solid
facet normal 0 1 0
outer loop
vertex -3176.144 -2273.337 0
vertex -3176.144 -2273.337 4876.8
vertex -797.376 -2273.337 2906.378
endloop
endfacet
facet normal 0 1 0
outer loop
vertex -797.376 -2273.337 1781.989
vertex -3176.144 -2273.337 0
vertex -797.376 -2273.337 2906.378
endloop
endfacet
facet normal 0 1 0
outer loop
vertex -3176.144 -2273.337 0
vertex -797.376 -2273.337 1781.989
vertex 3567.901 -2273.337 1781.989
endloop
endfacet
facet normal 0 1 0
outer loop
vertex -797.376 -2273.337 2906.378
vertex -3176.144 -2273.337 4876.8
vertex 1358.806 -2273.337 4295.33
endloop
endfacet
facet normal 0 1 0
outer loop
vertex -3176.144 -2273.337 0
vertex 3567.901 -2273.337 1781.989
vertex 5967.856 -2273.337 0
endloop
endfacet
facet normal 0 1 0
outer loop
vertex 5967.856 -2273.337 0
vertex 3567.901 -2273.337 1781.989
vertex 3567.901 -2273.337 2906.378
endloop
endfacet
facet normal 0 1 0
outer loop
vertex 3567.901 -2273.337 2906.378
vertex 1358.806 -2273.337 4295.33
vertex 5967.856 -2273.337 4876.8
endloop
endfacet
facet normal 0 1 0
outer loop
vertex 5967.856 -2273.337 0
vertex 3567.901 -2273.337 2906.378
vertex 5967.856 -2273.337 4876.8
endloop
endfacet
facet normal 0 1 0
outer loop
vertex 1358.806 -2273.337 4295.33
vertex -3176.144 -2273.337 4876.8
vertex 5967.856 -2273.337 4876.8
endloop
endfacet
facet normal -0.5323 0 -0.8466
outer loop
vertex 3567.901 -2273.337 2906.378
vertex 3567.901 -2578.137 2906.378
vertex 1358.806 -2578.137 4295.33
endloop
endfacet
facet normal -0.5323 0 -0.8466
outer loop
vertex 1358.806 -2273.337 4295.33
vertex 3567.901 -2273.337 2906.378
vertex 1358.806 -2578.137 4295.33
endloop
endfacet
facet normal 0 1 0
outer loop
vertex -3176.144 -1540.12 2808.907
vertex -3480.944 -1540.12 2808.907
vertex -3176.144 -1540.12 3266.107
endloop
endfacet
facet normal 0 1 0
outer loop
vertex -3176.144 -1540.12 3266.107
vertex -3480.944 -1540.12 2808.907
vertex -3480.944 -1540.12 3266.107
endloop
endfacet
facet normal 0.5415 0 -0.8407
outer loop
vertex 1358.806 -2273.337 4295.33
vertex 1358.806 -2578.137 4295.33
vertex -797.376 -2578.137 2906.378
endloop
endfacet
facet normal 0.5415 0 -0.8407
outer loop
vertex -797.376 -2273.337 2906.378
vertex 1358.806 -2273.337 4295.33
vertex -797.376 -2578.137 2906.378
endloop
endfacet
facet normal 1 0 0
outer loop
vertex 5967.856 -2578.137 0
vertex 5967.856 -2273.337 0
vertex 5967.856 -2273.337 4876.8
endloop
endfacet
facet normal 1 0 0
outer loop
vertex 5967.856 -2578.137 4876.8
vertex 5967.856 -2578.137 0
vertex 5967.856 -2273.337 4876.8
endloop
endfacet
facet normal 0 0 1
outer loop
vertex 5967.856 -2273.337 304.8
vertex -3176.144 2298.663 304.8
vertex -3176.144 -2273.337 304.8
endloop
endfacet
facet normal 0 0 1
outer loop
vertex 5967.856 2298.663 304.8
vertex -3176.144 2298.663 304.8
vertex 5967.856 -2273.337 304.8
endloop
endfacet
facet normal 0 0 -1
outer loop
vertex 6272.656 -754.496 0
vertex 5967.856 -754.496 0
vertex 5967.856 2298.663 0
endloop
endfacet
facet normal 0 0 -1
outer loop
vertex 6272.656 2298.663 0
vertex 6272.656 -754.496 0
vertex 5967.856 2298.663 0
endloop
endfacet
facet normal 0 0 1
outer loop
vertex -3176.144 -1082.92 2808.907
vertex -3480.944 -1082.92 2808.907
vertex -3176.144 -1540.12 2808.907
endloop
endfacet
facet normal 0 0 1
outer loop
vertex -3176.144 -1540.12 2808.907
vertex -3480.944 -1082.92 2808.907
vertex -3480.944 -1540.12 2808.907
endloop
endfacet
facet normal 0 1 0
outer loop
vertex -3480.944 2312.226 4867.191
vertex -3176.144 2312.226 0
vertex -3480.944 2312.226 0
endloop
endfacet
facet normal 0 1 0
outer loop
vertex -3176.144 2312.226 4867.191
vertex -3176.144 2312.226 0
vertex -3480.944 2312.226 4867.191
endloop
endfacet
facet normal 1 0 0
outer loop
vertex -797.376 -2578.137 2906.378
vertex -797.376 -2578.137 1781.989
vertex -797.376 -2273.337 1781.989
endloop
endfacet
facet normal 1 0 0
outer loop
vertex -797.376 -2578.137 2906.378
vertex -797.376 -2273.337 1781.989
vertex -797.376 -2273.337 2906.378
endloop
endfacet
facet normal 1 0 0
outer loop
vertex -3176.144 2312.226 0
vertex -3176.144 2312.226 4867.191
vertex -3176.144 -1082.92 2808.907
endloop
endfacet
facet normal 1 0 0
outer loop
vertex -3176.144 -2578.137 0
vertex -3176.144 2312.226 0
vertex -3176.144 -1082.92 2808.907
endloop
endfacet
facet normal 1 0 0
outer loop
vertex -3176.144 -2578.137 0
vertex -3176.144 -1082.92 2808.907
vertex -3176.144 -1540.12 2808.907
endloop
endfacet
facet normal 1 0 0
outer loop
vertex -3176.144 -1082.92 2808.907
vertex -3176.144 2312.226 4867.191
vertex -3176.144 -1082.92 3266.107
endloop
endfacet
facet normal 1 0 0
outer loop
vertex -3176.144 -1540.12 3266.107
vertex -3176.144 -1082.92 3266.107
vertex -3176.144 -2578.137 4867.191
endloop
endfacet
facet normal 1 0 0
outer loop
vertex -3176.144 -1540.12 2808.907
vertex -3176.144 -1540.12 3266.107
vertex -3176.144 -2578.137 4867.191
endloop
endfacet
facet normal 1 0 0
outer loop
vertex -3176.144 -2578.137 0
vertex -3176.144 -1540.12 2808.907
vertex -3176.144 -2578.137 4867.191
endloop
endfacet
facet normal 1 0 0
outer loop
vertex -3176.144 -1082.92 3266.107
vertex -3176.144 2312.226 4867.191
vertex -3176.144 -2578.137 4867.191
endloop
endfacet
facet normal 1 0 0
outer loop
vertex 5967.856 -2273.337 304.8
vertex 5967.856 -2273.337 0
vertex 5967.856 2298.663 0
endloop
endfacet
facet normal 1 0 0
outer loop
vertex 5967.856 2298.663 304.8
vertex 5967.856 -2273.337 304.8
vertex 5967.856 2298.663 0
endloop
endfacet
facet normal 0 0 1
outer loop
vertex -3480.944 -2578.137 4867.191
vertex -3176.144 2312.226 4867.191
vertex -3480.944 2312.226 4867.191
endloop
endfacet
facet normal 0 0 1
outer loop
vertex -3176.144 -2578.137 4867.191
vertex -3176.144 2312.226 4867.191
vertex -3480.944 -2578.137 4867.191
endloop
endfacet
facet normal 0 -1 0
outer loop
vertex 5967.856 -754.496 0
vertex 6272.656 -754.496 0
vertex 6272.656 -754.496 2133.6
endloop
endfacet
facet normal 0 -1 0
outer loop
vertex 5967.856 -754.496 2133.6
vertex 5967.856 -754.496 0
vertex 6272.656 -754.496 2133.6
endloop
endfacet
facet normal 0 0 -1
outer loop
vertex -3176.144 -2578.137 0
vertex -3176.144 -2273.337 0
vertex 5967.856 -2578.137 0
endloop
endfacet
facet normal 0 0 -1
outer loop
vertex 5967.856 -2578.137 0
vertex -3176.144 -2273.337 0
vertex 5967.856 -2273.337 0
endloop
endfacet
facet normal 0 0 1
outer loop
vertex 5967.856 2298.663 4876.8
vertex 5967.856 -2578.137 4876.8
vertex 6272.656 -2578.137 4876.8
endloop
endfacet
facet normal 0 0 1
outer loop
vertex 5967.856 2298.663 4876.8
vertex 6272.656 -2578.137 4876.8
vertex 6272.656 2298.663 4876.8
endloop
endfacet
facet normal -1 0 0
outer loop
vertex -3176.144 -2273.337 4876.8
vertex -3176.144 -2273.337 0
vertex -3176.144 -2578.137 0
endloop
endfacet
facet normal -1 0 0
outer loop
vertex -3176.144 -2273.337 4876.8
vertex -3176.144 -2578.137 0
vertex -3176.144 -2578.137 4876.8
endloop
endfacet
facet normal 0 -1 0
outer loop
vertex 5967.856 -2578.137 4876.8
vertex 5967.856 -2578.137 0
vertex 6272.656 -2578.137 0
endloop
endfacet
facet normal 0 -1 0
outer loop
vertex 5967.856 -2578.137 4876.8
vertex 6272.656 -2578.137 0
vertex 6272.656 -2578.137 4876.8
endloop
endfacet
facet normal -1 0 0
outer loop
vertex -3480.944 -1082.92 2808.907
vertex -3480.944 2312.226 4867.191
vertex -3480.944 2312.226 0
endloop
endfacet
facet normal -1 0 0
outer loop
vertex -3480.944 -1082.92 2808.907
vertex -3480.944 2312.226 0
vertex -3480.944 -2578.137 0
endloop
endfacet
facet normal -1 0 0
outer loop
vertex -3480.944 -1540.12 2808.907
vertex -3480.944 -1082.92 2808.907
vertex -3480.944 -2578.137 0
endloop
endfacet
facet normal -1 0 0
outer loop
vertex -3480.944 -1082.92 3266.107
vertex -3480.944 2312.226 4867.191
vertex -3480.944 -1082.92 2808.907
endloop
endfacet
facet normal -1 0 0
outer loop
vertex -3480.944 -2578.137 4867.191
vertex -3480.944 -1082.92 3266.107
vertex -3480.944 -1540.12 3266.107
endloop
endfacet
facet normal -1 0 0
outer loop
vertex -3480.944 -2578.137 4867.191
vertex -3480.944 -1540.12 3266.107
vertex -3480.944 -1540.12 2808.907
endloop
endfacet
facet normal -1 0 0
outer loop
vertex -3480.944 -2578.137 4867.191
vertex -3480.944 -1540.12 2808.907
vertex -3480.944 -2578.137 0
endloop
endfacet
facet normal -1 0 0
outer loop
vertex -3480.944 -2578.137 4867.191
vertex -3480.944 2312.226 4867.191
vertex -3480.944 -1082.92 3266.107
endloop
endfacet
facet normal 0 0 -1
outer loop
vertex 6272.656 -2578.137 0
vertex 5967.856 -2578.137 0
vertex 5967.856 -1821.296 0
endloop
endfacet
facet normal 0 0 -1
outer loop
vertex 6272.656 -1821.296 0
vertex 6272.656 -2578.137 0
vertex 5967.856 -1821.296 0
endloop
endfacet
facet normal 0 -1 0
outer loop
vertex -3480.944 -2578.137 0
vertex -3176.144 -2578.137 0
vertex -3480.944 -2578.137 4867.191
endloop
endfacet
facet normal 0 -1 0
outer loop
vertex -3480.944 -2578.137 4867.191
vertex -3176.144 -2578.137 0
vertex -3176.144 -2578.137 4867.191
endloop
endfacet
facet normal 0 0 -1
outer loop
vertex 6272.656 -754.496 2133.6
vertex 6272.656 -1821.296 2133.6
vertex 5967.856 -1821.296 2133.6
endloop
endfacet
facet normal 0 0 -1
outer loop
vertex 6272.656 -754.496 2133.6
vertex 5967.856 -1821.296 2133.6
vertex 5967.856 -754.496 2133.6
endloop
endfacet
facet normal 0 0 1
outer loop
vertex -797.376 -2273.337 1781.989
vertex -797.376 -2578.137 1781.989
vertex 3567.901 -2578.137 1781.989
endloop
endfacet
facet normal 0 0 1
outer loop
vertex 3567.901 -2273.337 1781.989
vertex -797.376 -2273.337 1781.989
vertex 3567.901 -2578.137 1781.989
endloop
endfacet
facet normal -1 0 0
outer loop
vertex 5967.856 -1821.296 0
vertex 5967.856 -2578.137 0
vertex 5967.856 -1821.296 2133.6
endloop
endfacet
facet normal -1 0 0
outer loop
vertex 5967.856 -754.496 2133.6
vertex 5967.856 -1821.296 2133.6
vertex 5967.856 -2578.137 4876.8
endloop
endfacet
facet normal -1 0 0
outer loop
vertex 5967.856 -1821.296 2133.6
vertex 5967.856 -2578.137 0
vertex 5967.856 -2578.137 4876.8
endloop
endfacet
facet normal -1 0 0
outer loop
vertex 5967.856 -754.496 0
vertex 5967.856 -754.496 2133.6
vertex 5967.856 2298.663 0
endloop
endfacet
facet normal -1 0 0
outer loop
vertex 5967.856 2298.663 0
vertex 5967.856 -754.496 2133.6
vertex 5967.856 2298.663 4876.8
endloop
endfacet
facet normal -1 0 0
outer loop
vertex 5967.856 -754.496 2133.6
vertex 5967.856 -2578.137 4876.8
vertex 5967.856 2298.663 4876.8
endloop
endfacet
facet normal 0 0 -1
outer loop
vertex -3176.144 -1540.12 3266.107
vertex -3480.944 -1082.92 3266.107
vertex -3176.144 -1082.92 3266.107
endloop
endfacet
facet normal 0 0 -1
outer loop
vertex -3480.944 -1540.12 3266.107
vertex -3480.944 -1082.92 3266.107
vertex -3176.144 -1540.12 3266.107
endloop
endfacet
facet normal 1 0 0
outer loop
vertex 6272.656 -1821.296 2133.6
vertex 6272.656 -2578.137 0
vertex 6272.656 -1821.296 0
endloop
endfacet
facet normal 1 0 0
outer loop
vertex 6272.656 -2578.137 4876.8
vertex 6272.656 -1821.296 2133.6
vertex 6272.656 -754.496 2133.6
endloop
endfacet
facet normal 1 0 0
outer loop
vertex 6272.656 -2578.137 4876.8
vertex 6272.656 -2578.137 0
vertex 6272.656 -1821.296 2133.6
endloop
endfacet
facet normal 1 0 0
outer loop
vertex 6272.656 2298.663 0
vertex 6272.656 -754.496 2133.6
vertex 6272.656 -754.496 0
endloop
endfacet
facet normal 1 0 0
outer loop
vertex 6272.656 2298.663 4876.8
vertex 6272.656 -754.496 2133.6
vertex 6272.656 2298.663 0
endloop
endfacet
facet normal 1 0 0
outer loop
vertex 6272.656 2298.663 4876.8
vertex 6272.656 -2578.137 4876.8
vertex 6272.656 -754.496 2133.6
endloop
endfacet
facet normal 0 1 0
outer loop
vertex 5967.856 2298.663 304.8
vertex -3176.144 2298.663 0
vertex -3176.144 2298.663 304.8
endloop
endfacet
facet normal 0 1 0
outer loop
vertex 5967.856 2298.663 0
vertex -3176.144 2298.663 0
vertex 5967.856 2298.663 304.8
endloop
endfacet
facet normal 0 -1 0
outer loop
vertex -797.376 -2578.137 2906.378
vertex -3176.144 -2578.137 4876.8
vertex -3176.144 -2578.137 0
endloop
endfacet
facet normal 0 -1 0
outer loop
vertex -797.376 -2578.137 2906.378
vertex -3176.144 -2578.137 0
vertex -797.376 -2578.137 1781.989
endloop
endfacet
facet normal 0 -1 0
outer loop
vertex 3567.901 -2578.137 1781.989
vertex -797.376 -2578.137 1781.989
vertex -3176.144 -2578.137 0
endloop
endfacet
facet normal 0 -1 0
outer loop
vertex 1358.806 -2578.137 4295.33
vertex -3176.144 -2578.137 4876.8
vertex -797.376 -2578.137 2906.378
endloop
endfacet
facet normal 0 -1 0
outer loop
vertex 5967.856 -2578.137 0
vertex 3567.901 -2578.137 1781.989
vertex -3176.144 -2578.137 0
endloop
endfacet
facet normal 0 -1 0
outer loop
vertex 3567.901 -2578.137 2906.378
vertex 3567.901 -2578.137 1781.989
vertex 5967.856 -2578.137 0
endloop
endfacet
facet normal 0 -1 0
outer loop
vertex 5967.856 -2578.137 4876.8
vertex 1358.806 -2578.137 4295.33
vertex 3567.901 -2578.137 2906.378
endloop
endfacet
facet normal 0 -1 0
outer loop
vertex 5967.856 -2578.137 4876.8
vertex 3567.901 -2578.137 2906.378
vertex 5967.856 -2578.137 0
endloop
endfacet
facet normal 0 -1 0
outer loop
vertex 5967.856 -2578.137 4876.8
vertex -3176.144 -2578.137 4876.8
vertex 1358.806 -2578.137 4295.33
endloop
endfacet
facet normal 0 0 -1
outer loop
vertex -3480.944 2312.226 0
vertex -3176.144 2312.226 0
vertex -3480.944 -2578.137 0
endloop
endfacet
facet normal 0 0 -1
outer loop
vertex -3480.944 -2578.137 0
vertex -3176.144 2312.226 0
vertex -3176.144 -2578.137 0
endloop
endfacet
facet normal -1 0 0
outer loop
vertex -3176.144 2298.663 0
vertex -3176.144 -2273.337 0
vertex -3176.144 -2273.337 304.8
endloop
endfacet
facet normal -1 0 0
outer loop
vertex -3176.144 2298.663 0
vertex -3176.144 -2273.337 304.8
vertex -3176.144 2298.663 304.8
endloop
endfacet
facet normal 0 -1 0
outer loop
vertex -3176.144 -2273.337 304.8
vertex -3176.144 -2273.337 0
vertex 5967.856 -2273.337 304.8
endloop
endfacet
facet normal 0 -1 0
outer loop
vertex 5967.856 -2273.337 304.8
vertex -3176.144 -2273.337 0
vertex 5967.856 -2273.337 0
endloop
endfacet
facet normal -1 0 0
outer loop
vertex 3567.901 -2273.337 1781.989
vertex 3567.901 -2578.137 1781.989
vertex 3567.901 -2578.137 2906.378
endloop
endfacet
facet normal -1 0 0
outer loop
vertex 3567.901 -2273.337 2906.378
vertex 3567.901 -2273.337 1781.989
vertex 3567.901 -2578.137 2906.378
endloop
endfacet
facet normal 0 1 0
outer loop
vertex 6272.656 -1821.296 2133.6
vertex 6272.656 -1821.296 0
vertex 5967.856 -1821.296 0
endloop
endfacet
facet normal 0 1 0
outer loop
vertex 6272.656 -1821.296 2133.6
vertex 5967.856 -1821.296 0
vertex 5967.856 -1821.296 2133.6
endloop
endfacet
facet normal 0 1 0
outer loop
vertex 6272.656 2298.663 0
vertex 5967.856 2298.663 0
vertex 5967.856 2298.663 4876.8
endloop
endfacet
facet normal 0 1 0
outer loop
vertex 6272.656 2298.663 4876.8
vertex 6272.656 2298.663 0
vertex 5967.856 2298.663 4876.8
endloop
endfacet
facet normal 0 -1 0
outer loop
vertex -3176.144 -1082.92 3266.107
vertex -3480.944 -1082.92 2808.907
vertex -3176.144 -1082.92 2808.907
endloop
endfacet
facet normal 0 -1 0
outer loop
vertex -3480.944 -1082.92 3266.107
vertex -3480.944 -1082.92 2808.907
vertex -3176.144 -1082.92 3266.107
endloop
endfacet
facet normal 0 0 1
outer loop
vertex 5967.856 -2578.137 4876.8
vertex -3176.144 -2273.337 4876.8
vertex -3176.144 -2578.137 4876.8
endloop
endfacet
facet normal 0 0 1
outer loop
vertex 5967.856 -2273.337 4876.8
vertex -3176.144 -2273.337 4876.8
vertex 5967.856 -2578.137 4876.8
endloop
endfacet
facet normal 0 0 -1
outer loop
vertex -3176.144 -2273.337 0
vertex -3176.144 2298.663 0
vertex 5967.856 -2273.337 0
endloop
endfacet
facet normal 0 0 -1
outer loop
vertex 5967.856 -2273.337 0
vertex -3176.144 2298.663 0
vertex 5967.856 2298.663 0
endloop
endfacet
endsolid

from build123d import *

# Parameters (mm, degrees)
F0_W      = 9144
F0_H      = 4572
F1_DEPTH  = 304.8
F2_W      = 9144
F2_H      = 4876.8
F3_DEPTH  = 304.8
F4_W      = 4876.8
F4_H      = 4876.8
F5_DEPTH  = 304.8
F6_W      = 4890.3621263981
F6_H      = 4867.1908378601
F7_DEPTH  = 304.8
F8_W      = 457.2
F8_H      = 457.2
F9_DEPTH  = 609.6
F10_W     = 1066.8
F10_H     = 2133.6
F11_DEPTH = 304.8
F12_W     = 2156.182050705
F12_H     = 1124.3895292282
F12_W_2   = 2209.0947628021
F13_DEPTH = 304.8


with BuildPart() as f1:
    # F0 (on Top) → F1 (new body)
    with BuildSketch(Plane.XY):
        with Locations((1395.8555042158, 12.6634538174)):
            Rectangle(F0_W, F0_H)
    extrude(amount=F1_DEPTH)


with BuildPart() as f3:
    # F2 (on face) → F3 (new body)
    with BuildSketch(Plane.XZ.offset(2273.3365461826)):
        with Locations((1395.8555042158, 2438.4)):
            Rectangle(F2_W, F2_H)
    extrude(amount=F3_DEPTH)

    # F12 (on face) → F13 (cut)
    with BuildSketch(Plane.XZ.offset(2578.1365461826)):
        Polygon((1358.8061332703, 4295.3300476074), (-797.3759174347, 2906.3782691956), (1358.8061332703, 2906.3782691956), (3567.9008960724, 2906.3782691956), align=None)
        with Locations((280.7151079178, 2344.1835045815)):
            Rectangle(F12_W, F12_H)
        with Locations((2463.3535146713, 2344.1835045815)):
            Rectangle(F12_W_2, F12_H)
    extrude(amount=-F13_DEPTH, mode=Mode.SUBTRACT)


with BuildPart() as f5:
    # F4 (on face) → F5 (new body)
    with BuildSketch(Plane.YZ.offset(5967.8555042158)):
        with Locations((-139.7365461826, 2438.4)):
            Rectangle(F4_W, F4_H)
    extrude(amount=F5_DEPTH)

    # F10 (on face) → F11 (cut)
    with BuildSketch(Plane.YZ.offset(6272.6555042158)):
        with Locations((-1287.8959766388, 1066.8)):
            Rectangle(F10_W, F10_H)
    extrude(amount=-F11_DEPTH, mode=Mode.SUBTRACT)


with BuildPart() as f7:
    # F6 (on face) → F7 (new body)
    with BuildSketch(Plane(origin=(-3176.1444957842, 0, 0), x_dir=(0, -1, 0), z_dir=(-1, 0, 0))):
        with Locations((132.9554829836, 2433.5954189301)):
            Rectangle(F6_W, F6_H)
    extrude(amount=F7_DEPTH)

    # F8 (on face) → F9 (cut)
    with BuildSketch(Plane(origin=(-3480.9444957842, 0, 0), x_dir=(0, -1, 0), z_dir=(-1, 0, 0))):
        with Locations((1311.5199804306, 3037.5073265517)):
            Rectangle(F8_W, F8_H)
    extrude(amount=-F9_DEPTH, mode=Mode.SUBTRACT)


solid = Compound([f1.part, f3.part, f5.part, f7.part])
